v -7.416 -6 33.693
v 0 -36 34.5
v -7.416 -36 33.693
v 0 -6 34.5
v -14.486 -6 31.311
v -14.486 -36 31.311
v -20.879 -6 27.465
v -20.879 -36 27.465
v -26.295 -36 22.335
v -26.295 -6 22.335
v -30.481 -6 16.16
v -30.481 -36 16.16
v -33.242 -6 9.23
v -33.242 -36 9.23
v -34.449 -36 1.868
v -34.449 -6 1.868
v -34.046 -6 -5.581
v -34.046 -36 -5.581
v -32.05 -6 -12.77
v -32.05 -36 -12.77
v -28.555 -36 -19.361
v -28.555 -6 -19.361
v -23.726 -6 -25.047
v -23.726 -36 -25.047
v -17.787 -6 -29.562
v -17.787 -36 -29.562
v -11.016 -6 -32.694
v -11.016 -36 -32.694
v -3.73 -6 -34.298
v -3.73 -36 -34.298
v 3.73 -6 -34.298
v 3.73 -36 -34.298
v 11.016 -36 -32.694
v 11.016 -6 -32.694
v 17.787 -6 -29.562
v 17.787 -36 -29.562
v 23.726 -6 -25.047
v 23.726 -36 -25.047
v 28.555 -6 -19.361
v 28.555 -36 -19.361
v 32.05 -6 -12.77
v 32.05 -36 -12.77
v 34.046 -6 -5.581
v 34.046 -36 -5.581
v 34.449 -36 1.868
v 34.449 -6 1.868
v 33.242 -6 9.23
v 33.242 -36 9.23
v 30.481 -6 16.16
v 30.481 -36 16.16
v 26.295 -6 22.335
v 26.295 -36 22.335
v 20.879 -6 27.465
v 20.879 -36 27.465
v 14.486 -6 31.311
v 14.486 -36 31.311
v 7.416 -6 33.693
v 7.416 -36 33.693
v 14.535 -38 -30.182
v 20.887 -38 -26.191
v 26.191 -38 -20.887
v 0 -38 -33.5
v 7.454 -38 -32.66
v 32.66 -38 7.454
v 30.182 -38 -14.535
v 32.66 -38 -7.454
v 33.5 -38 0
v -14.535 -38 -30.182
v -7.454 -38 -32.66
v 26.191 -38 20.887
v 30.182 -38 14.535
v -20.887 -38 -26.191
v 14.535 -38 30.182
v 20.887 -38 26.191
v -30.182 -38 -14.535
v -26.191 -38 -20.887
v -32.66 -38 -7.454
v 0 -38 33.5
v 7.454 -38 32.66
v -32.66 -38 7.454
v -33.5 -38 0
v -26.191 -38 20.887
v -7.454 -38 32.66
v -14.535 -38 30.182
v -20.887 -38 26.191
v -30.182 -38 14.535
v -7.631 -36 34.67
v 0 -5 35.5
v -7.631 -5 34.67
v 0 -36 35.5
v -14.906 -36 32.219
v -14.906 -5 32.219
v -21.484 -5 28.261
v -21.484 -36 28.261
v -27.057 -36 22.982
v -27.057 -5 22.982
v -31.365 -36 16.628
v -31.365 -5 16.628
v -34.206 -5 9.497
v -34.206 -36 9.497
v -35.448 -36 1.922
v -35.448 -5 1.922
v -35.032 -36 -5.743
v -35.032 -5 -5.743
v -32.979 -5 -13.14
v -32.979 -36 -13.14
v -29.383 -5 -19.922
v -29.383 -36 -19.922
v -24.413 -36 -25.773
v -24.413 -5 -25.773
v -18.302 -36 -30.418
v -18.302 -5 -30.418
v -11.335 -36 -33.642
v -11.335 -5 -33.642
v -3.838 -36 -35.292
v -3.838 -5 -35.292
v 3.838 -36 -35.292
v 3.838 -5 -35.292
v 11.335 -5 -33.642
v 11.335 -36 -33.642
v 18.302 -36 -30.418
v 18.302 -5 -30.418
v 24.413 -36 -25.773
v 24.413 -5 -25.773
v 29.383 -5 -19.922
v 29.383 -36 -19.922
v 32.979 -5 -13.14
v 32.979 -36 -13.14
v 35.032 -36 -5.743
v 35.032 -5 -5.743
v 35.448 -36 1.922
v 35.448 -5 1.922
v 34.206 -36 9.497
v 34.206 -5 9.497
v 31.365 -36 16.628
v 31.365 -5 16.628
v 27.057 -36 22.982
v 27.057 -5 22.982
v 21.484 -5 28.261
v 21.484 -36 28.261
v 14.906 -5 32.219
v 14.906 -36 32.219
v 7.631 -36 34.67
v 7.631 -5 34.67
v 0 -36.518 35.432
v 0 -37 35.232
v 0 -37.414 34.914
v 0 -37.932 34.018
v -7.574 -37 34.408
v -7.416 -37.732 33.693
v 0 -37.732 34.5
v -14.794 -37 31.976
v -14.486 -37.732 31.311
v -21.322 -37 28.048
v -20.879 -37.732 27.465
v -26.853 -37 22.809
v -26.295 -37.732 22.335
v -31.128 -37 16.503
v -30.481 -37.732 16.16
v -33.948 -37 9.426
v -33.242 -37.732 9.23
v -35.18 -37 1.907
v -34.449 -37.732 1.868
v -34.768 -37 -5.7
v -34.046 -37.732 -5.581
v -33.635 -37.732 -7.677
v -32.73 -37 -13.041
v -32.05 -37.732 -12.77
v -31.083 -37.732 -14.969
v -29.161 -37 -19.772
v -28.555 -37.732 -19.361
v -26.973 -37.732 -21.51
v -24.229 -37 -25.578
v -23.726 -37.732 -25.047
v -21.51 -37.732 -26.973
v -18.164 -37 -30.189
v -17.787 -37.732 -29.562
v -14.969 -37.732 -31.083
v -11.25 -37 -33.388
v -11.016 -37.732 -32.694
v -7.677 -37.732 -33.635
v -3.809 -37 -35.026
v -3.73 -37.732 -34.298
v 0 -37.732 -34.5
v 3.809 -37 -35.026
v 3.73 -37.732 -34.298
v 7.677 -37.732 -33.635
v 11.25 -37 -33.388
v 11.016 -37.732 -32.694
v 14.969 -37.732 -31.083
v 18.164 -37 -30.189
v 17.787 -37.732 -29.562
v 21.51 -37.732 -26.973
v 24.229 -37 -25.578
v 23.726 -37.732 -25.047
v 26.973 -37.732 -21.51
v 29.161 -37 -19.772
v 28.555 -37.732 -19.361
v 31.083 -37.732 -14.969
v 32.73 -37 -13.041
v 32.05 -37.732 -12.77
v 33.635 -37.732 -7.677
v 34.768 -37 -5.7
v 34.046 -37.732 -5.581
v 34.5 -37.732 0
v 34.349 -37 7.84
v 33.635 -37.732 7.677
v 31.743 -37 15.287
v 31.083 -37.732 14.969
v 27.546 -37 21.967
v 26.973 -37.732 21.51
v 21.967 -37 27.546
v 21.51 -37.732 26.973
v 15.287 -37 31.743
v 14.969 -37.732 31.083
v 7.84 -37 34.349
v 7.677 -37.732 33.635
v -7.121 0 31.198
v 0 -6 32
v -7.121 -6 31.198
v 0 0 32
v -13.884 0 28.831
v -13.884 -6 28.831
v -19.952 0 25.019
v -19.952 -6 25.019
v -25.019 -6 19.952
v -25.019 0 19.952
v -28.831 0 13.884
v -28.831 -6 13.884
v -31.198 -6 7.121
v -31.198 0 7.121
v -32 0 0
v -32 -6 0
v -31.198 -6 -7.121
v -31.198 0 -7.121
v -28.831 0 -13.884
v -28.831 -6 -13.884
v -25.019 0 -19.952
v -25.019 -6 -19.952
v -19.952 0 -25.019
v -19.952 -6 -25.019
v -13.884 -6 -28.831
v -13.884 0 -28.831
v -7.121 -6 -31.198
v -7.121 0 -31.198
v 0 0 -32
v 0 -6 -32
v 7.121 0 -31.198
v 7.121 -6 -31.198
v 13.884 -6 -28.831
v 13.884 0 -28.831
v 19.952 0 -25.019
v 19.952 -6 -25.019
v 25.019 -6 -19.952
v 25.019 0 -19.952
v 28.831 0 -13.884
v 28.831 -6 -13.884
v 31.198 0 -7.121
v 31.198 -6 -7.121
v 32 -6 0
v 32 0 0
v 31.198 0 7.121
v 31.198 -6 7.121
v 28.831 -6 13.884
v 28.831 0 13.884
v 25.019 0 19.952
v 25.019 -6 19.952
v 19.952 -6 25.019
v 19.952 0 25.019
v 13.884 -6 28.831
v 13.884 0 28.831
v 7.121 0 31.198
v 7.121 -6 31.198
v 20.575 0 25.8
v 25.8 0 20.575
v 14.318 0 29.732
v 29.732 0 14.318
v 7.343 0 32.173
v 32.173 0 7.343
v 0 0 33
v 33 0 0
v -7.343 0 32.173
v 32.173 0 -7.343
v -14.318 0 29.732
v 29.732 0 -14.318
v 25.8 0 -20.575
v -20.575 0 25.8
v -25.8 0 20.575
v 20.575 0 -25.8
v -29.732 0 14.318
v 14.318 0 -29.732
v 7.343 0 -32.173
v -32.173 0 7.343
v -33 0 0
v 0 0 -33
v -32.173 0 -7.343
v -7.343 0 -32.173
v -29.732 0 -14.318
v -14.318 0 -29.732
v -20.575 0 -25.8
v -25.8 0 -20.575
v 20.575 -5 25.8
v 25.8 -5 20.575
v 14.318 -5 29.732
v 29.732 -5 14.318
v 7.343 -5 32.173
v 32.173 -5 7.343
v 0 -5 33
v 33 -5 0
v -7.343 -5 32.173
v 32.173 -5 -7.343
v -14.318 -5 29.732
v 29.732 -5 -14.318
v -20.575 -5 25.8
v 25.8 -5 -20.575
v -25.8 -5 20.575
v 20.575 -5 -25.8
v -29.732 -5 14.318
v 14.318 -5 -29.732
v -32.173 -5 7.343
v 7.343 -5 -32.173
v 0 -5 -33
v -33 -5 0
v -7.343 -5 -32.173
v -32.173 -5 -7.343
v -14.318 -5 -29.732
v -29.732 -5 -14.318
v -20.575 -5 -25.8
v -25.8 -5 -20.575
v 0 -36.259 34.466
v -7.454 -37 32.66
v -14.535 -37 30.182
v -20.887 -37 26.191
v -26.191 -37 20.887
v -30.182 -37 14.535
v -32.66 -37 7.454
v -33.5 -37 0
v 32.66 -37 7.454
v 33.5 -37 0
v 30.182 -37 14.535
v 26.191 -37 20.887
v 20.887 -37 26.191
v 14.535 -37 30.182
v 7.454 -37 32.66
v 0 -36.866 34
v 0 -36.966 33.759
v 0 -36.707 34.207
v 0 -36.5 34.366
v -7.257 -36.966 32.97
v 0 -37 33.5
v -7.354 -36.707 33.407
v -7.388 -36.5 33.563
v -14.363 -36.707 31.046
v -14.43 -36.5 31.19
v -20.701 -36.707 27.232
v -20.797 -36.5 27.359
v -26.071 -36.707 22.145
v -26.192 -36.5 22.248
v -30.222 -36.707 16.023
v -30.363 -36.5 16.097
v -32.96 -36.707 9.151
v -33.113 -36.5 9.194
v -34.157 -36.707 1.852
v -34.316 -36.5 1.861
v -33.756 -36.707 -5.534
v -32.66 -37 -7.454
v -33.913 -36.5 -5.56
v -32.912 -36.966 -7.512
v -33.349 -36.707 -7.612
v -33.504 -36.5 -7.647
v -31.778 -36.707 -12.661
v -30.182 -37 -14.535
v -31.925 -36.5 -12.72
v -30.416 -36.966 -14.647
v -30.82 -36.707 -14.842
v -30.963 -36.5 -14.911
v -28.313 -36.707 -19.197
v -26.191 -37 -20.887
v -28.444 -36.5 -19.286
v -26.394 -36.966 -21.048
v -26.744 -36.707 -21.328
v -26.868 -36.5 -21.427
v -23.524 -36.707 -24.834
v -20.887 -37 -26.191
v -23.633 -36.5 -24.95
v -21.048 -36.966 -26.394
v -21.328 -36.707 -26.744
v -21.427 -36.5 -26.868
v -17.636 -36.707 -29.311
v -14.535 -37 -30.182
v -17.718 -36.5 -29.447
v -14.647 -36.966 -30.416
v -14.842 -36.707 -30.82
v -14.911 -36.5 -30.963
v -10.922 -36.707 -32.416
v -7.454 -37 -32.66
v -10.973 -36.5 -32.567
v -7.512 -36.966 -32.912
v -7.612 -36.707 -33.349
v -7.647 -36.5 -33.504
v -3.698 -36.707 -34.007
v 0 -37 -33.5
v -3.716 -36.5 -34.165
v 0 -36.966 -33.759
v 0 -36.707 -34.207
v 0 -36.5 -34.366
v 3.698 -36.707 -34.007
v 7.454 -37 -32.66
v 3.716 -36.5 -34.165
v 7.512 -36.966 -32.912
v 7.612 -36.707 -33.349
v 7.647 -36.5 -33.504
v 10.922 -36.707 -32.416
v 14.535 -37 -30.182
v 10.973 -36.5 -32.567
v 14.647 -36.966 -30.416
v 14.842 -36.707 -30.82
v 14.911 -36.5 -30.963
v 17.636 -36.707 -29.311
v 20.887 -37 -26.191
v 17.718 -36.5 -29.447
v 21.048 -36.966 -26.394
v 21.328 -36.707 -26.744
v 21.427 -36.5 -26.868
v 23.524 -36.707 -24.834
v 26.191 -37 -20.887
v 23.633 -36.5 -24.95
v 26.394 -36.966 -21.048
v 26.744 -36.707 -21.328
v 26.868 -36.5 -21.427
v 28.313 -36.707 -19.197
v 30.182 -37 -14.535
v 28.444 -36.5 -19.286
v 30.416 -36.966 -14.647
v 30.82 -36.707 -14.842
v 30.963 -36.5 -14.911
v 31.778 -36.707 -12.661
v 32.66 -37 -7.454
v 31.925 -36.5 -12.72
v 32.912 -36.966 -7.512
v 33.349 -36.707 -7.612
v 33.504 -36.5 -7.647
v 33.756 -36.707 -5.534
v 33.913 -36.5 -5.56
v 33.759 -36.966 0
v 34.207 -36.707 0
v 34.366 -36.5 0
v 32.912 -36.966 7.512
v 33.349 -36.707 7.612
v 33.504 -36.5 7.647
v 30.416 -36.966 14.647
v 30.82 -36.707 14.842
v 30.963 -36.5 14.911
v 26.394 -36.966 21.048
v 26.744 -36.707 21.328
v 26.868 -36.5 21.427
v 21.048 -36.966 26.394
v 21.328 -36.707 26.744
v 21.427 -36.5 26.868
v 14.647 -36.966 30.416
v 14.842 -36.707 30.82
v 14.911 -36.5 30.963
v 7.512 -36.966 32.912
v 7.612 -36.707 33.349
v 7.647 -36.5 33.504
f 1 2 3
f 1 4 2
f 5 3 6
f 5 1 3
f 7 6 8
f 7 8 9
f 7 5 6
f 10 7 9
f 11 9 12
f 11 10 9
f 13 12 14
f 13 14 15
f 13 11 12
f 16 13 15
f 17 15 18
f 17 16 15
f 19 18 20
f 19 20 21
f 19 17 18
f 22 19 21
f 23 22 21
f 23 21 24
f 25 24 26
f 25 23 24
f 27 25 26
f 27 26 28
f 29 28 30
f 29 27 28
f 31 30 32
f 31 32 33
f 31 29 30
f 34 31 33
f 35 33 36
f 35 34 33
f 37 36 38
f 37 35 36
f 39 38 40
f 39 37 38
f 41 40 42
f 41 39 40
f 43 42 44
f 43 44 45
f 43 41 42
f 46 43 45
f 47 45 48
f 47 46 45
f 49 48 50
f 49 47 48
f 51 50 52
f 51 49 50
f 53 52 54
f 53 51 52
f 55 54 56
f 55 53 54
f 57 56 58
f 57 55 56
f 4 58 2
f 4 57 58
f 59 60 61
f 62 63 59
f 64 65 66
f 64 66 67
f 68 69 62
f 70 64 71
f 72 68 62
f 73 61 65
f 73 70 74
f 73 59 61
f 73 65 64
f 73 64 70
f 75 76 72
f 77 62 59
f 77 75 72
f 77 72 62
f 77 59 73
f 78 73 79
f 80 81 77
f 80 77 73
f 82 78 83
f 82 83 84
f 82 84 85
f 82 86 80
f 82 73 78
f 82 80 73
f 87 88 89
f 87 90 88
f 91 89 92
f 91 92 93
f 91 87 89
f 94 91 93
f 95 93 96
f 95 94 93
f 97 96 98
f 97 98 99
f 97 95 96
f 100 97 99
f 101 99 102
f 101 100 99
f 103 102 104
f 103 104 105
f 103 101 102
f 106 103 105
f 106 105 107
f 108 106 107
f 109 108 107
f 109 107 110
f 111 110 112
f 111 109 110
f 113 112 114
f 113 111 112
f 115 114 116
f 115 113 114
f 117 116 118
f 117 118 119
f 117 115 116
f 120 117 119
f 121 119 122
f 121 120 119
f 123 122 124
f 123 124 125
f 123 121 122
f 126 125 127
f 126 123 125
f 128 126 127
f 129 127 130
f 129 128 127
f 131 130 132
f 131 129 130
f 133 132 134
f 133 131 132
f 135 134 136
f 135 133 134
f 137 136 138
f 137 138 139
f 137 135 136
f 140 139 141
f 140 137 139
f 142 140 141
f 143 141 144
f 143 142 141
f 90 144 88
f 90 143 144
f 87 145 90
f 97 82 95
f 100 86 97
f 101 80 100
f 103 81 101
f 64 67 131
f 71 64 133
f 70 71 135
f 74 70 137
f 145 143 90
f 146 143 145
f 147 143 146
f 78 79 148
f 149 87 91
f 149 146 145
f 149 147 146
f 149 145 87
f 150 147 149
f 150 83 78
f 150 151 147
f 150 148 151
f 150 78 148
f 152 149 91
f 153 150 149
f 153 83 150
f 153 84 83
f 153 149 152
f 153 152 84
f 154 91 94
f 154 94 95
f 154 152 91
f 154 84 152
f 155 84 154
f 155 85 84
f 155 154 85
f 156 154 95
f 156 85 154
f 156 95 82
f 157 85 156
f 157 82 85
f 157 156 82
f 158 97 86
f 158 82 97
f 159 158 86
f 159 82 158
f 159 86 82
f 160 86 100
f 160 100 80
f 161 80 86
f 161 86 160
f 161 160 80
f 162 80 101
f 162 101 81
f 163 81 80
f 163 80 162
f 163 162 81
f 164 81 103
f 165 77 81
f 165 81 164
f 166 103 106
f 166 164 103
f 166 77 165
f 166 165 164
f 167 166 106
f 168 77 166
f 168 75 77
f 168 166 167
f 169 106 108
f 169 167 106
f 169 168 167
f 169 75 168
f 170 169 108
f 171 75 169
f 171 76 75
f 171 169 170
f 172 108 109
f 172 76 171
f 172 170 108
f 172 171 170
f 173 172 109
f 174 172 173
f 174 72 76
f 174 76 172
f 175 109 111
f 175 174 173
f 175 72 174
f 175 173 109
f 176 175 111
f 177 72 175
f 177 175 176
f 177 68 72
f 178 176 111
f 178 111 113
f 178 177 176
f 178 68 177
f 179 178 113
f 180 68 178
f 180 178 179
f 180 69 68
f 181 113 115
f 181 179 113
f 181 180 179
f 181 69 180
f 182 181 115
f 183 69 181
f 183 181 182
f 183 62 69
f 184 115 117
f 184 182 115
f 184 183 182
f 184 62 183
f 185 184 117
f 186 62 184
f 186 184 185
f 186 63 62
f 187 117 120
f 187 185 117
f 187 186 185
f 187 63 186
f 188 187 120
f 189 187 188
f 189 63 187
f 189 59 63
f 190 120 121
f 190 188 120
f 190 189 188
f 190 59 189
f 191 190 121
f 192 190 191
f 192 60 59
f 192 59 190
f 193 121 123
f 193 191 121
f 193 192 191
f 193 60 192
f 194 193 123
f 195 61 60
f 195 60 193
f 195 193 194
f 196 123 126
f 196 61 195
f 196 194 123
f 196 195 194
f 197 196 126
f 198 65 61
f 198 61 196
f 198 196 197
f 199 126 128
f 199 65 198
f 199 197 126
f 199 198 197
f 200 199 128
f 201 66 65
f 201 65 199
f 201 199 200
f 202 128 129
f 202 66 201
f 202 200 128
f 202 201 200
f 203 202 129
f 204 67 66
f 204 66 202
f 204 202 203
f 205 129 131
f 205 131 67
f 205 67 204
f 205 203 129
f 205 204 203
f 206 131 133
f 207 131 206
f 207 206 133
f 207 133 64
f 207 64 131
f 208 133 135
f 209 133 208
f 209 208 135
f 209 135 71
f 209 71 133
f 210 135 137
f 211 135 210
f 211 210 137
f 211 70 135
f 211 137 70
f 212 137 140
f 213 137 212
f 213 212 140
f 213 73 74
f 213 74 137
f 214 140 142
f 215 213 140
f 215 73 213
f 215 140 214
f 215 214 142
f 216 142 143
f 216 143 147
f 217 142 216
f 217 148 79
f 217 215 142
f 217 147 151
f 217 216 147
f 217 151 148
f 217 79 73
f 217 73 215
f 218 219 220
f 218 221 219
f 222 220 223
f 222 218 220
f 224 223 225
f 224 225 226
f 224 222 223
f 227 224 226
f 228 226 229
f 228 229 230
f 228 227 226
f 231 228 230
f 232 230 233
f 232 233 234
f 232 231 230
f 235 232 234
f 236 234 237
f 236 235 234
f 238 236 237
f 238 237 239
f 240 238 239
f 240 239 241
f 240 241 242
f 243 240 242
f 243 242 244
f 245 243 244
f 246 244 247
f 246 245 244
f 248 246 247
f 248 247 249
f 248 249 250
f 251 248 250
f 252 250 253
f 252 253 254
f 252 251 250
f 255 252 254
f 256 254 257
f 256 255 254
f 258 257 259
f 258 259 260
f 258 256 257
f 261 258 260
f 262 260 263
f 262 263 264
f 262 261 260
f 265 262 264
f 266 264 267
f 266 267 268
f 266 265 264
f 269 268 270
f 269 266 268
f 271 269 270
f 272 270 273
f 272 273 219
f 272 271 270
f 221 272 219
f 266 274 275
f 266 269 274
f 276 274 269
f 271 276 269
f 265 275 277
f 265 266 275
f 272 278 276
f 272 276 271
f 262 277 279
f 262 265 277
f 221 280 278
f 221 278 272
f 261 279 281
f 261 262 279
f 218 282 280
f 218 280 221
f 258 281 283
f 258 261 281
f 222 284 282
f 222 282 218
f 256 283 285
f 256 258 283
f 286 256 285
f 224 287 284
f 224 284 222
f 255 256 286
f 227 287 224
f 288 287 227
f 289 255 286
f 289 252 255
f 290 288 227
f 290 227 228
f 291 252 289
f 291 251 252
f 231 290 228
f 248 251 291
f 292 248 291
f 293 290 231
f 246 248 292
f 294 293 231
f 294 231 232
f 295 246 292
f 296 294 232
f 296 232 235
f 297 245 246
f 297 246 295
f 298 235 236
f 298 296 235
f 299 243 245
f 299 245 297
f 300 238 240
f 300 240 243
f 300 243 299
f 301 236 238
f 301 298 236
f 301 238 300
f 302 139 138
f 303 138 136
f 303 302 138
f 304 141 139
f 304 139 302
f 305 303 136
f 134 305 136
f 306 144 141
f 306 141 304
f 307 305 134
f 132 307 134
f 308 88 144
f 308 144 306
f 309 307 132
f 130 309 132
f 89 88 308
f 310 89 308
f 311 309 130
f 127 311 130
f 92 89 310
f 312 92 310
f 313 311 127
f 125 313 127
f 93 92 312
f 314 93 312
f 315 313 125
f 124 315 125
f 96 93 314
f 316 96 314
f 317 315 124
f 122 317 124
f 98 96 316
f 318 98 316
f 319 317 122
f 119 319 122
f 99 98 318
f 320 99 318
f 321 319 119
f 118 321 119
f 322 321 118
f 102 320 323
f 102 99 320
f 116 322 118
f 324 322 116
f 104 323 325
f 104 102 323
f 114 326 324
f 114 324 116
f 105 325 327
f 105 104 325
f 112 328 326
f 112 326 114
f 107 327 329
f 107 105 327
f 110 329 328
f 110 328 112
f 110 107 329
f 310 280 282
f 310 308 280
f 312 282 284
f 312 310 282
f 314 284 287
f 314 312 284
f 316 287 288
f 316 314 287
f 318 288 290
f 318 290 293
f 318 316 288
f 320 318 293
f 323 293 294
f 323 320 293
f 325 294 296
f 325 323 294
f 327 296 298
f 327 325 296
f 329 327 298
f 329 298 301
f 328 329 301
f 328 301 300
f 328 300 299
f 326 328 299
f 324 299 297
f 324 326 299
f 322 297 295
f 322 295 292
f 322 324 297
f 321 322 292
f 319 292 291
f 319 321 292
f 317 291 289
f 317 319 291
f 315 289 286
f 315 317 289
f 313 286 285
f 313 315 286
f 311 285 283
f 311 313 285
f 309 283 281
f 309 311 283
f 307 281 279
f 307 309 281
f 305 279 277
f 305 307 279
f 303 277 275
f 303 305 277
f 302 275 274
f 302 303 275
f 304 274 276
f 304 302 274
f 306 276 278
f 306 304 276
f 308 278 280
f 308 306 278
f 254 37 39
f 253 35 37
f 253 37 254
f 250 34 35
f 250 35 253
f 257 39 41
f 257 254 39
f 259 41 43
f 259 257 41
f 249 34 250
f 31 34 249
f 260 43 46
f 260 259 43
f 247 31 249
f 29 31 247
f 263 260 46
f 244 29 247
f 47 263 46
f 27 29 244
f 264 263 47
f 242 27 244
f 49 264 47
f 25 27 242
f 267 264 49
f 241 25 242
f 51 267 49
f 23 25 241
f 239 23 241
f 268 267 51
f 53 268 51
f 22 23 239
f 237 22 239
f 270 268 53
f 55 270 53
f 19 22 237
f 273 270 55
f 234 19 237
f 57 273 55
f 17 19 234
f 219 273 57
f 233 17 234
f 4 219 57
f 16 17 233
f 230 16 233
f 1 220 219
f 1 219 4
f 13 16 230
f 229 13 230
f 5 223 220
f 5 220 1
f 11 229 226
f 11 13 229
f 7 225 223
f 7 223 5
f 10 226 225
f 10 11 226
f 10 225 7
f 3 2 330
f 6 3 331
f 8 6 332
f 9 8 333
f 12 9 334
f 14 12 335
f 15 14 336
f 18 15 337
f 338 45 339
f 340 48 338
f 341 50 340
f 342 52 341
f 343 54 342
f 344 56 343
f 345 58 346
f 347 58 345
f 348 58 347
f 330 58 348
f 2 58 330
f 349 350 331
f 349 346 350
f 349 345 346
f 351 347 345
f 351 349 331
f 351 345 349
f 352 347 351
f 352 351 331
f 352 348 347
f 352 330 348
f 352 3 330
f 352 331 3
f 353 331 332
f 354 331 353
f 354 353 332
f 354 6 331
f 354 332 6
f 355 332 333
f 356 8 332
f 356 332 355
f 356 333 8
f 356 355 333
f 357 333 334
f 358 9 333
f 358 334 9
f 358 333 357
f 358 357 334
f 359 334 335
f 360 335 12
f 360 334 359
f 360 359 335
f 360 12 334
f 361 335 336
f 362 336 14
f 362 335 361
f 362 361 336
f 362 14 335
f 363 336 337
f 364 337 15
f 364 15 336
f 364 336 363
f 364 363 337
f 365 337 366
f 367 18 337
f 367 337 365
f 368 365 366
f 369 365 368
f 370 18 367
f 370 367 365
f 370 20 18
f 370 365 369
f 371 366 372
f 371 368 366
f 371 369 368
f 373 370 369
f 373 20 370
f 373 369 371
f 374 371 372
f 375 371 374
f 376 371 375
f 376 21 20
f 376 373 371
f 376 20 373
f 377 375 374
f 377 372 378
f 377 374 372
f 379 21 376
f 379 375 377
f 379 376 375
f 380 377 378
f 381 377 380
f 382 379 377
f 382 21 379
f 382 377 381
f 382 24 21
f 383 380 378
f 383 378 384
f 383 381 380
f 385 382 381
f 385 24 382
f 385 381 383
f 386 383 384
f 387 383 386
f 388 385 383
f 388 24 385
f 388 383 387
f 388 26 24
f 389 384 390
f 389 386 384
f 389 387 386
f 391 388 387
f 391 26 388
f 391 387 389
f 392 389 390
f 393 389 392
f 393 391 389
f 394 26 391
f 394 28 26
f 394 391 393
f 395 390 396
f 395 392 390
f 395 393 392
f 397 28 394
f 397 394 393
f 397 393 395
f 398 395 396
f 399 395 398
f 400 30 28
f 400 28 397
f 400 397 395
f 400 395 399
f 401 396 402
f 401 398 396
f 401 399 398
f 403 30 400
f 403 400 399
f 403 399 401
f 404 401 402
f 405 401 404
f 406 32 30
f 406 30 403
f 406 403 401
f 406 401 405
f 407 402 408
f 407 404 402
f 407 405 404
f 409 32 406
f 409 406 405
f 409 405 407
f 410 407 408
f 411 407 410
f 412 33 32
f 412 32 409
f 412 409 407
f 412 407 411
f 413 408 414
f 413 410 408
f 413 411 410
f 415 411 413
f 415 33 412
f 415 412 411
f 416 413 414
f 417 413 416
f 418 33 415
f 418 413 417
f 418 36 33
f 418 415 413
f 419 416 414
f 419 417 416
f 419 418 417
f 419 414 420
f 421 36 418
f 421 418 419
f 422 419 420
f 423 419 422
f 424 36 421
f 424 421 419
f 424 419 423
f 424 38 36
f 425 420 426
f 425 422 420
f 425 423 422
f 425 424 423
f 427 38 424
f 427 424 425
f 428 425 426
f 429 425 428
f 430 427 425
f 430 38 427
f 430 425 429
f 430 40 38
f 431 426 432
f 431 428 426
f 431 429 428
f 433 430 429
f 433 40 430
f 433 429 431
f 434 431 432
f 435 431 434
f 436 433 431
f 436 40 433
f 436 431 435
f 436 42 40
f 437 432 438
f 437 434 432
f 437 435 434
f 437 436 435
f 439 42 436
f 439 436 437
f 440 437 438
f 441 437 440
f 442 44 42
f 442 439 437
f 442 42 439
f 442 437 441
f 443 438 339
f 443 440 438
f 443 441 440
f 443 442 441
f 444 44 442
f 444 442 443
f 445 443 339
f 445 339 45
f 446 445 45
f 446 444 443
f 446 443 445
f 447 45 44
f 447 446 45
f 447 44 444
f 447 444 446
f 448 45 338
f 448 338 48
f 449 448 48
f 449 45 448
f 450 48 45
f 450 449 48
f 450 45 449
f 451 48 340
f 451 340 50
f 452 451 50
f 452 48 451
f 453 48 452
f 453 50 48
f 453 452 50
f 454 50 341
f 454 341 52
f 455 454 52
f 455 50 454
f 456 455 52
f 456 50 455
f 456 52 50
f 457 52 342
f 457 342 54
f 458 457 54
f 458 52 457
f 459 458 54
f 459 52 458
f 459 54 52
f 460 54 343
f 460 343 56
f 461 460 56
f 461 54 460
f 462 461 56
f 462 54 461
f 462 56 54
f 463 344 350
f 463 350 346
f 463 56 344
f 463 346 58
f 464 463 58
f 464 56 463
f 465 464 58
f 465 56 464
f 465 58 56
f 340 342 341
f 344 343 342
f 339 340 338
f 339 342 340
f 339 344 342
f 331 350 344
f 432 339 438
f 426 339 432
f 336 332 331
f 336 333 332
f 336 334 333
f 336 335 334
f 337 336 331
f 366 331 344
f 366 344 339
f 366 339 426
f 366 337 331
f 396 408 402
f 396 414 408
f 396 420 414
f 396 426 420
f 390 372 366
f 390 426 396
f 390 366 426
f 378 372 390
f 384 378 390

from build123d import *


with BuildPart() as part:
    # 草图1 → 旋转1 (revolve)
    with BuildSketch(Plane(origin=(0, 0, 0), x_dir=(0, 0, -1), z_dir=(1, 0, 0)), mode=Mode.PRIVATE) as revolve_1_sk:
        with BuildLine():
            Line((33, 0), (33, -5))
            Line((33, -5), (35.5, -5))
            Line((35.5, -5), (35.5, -36))
            ThreePointArc((35.5, -36), (34.914213562, -37.414213562), (33.5, -38))
            Line((33.5, -38), (0, -38))
            Line((0, -38), (0, -37))
            Line((0, -37), (33.5, -37))
            ThreePointArc((33.5, -37), (34.207106781, -36.707106781), (34.5, -36))
            Line((34.5, -36), (34.5, -6))
            Line((34.5, -6), (32, -6))
            Line((32, -6), (32, 0))
            Line((32, 0), (33, 0))
        make_face()
    revolve(revolve_1_sk.sketch.rotate(Axis((0, 1.9, 0), (0, -1, 0)), 180), axis=Axis((0, 1.9, 0), (0, -1, 0)))


solid = part.part
